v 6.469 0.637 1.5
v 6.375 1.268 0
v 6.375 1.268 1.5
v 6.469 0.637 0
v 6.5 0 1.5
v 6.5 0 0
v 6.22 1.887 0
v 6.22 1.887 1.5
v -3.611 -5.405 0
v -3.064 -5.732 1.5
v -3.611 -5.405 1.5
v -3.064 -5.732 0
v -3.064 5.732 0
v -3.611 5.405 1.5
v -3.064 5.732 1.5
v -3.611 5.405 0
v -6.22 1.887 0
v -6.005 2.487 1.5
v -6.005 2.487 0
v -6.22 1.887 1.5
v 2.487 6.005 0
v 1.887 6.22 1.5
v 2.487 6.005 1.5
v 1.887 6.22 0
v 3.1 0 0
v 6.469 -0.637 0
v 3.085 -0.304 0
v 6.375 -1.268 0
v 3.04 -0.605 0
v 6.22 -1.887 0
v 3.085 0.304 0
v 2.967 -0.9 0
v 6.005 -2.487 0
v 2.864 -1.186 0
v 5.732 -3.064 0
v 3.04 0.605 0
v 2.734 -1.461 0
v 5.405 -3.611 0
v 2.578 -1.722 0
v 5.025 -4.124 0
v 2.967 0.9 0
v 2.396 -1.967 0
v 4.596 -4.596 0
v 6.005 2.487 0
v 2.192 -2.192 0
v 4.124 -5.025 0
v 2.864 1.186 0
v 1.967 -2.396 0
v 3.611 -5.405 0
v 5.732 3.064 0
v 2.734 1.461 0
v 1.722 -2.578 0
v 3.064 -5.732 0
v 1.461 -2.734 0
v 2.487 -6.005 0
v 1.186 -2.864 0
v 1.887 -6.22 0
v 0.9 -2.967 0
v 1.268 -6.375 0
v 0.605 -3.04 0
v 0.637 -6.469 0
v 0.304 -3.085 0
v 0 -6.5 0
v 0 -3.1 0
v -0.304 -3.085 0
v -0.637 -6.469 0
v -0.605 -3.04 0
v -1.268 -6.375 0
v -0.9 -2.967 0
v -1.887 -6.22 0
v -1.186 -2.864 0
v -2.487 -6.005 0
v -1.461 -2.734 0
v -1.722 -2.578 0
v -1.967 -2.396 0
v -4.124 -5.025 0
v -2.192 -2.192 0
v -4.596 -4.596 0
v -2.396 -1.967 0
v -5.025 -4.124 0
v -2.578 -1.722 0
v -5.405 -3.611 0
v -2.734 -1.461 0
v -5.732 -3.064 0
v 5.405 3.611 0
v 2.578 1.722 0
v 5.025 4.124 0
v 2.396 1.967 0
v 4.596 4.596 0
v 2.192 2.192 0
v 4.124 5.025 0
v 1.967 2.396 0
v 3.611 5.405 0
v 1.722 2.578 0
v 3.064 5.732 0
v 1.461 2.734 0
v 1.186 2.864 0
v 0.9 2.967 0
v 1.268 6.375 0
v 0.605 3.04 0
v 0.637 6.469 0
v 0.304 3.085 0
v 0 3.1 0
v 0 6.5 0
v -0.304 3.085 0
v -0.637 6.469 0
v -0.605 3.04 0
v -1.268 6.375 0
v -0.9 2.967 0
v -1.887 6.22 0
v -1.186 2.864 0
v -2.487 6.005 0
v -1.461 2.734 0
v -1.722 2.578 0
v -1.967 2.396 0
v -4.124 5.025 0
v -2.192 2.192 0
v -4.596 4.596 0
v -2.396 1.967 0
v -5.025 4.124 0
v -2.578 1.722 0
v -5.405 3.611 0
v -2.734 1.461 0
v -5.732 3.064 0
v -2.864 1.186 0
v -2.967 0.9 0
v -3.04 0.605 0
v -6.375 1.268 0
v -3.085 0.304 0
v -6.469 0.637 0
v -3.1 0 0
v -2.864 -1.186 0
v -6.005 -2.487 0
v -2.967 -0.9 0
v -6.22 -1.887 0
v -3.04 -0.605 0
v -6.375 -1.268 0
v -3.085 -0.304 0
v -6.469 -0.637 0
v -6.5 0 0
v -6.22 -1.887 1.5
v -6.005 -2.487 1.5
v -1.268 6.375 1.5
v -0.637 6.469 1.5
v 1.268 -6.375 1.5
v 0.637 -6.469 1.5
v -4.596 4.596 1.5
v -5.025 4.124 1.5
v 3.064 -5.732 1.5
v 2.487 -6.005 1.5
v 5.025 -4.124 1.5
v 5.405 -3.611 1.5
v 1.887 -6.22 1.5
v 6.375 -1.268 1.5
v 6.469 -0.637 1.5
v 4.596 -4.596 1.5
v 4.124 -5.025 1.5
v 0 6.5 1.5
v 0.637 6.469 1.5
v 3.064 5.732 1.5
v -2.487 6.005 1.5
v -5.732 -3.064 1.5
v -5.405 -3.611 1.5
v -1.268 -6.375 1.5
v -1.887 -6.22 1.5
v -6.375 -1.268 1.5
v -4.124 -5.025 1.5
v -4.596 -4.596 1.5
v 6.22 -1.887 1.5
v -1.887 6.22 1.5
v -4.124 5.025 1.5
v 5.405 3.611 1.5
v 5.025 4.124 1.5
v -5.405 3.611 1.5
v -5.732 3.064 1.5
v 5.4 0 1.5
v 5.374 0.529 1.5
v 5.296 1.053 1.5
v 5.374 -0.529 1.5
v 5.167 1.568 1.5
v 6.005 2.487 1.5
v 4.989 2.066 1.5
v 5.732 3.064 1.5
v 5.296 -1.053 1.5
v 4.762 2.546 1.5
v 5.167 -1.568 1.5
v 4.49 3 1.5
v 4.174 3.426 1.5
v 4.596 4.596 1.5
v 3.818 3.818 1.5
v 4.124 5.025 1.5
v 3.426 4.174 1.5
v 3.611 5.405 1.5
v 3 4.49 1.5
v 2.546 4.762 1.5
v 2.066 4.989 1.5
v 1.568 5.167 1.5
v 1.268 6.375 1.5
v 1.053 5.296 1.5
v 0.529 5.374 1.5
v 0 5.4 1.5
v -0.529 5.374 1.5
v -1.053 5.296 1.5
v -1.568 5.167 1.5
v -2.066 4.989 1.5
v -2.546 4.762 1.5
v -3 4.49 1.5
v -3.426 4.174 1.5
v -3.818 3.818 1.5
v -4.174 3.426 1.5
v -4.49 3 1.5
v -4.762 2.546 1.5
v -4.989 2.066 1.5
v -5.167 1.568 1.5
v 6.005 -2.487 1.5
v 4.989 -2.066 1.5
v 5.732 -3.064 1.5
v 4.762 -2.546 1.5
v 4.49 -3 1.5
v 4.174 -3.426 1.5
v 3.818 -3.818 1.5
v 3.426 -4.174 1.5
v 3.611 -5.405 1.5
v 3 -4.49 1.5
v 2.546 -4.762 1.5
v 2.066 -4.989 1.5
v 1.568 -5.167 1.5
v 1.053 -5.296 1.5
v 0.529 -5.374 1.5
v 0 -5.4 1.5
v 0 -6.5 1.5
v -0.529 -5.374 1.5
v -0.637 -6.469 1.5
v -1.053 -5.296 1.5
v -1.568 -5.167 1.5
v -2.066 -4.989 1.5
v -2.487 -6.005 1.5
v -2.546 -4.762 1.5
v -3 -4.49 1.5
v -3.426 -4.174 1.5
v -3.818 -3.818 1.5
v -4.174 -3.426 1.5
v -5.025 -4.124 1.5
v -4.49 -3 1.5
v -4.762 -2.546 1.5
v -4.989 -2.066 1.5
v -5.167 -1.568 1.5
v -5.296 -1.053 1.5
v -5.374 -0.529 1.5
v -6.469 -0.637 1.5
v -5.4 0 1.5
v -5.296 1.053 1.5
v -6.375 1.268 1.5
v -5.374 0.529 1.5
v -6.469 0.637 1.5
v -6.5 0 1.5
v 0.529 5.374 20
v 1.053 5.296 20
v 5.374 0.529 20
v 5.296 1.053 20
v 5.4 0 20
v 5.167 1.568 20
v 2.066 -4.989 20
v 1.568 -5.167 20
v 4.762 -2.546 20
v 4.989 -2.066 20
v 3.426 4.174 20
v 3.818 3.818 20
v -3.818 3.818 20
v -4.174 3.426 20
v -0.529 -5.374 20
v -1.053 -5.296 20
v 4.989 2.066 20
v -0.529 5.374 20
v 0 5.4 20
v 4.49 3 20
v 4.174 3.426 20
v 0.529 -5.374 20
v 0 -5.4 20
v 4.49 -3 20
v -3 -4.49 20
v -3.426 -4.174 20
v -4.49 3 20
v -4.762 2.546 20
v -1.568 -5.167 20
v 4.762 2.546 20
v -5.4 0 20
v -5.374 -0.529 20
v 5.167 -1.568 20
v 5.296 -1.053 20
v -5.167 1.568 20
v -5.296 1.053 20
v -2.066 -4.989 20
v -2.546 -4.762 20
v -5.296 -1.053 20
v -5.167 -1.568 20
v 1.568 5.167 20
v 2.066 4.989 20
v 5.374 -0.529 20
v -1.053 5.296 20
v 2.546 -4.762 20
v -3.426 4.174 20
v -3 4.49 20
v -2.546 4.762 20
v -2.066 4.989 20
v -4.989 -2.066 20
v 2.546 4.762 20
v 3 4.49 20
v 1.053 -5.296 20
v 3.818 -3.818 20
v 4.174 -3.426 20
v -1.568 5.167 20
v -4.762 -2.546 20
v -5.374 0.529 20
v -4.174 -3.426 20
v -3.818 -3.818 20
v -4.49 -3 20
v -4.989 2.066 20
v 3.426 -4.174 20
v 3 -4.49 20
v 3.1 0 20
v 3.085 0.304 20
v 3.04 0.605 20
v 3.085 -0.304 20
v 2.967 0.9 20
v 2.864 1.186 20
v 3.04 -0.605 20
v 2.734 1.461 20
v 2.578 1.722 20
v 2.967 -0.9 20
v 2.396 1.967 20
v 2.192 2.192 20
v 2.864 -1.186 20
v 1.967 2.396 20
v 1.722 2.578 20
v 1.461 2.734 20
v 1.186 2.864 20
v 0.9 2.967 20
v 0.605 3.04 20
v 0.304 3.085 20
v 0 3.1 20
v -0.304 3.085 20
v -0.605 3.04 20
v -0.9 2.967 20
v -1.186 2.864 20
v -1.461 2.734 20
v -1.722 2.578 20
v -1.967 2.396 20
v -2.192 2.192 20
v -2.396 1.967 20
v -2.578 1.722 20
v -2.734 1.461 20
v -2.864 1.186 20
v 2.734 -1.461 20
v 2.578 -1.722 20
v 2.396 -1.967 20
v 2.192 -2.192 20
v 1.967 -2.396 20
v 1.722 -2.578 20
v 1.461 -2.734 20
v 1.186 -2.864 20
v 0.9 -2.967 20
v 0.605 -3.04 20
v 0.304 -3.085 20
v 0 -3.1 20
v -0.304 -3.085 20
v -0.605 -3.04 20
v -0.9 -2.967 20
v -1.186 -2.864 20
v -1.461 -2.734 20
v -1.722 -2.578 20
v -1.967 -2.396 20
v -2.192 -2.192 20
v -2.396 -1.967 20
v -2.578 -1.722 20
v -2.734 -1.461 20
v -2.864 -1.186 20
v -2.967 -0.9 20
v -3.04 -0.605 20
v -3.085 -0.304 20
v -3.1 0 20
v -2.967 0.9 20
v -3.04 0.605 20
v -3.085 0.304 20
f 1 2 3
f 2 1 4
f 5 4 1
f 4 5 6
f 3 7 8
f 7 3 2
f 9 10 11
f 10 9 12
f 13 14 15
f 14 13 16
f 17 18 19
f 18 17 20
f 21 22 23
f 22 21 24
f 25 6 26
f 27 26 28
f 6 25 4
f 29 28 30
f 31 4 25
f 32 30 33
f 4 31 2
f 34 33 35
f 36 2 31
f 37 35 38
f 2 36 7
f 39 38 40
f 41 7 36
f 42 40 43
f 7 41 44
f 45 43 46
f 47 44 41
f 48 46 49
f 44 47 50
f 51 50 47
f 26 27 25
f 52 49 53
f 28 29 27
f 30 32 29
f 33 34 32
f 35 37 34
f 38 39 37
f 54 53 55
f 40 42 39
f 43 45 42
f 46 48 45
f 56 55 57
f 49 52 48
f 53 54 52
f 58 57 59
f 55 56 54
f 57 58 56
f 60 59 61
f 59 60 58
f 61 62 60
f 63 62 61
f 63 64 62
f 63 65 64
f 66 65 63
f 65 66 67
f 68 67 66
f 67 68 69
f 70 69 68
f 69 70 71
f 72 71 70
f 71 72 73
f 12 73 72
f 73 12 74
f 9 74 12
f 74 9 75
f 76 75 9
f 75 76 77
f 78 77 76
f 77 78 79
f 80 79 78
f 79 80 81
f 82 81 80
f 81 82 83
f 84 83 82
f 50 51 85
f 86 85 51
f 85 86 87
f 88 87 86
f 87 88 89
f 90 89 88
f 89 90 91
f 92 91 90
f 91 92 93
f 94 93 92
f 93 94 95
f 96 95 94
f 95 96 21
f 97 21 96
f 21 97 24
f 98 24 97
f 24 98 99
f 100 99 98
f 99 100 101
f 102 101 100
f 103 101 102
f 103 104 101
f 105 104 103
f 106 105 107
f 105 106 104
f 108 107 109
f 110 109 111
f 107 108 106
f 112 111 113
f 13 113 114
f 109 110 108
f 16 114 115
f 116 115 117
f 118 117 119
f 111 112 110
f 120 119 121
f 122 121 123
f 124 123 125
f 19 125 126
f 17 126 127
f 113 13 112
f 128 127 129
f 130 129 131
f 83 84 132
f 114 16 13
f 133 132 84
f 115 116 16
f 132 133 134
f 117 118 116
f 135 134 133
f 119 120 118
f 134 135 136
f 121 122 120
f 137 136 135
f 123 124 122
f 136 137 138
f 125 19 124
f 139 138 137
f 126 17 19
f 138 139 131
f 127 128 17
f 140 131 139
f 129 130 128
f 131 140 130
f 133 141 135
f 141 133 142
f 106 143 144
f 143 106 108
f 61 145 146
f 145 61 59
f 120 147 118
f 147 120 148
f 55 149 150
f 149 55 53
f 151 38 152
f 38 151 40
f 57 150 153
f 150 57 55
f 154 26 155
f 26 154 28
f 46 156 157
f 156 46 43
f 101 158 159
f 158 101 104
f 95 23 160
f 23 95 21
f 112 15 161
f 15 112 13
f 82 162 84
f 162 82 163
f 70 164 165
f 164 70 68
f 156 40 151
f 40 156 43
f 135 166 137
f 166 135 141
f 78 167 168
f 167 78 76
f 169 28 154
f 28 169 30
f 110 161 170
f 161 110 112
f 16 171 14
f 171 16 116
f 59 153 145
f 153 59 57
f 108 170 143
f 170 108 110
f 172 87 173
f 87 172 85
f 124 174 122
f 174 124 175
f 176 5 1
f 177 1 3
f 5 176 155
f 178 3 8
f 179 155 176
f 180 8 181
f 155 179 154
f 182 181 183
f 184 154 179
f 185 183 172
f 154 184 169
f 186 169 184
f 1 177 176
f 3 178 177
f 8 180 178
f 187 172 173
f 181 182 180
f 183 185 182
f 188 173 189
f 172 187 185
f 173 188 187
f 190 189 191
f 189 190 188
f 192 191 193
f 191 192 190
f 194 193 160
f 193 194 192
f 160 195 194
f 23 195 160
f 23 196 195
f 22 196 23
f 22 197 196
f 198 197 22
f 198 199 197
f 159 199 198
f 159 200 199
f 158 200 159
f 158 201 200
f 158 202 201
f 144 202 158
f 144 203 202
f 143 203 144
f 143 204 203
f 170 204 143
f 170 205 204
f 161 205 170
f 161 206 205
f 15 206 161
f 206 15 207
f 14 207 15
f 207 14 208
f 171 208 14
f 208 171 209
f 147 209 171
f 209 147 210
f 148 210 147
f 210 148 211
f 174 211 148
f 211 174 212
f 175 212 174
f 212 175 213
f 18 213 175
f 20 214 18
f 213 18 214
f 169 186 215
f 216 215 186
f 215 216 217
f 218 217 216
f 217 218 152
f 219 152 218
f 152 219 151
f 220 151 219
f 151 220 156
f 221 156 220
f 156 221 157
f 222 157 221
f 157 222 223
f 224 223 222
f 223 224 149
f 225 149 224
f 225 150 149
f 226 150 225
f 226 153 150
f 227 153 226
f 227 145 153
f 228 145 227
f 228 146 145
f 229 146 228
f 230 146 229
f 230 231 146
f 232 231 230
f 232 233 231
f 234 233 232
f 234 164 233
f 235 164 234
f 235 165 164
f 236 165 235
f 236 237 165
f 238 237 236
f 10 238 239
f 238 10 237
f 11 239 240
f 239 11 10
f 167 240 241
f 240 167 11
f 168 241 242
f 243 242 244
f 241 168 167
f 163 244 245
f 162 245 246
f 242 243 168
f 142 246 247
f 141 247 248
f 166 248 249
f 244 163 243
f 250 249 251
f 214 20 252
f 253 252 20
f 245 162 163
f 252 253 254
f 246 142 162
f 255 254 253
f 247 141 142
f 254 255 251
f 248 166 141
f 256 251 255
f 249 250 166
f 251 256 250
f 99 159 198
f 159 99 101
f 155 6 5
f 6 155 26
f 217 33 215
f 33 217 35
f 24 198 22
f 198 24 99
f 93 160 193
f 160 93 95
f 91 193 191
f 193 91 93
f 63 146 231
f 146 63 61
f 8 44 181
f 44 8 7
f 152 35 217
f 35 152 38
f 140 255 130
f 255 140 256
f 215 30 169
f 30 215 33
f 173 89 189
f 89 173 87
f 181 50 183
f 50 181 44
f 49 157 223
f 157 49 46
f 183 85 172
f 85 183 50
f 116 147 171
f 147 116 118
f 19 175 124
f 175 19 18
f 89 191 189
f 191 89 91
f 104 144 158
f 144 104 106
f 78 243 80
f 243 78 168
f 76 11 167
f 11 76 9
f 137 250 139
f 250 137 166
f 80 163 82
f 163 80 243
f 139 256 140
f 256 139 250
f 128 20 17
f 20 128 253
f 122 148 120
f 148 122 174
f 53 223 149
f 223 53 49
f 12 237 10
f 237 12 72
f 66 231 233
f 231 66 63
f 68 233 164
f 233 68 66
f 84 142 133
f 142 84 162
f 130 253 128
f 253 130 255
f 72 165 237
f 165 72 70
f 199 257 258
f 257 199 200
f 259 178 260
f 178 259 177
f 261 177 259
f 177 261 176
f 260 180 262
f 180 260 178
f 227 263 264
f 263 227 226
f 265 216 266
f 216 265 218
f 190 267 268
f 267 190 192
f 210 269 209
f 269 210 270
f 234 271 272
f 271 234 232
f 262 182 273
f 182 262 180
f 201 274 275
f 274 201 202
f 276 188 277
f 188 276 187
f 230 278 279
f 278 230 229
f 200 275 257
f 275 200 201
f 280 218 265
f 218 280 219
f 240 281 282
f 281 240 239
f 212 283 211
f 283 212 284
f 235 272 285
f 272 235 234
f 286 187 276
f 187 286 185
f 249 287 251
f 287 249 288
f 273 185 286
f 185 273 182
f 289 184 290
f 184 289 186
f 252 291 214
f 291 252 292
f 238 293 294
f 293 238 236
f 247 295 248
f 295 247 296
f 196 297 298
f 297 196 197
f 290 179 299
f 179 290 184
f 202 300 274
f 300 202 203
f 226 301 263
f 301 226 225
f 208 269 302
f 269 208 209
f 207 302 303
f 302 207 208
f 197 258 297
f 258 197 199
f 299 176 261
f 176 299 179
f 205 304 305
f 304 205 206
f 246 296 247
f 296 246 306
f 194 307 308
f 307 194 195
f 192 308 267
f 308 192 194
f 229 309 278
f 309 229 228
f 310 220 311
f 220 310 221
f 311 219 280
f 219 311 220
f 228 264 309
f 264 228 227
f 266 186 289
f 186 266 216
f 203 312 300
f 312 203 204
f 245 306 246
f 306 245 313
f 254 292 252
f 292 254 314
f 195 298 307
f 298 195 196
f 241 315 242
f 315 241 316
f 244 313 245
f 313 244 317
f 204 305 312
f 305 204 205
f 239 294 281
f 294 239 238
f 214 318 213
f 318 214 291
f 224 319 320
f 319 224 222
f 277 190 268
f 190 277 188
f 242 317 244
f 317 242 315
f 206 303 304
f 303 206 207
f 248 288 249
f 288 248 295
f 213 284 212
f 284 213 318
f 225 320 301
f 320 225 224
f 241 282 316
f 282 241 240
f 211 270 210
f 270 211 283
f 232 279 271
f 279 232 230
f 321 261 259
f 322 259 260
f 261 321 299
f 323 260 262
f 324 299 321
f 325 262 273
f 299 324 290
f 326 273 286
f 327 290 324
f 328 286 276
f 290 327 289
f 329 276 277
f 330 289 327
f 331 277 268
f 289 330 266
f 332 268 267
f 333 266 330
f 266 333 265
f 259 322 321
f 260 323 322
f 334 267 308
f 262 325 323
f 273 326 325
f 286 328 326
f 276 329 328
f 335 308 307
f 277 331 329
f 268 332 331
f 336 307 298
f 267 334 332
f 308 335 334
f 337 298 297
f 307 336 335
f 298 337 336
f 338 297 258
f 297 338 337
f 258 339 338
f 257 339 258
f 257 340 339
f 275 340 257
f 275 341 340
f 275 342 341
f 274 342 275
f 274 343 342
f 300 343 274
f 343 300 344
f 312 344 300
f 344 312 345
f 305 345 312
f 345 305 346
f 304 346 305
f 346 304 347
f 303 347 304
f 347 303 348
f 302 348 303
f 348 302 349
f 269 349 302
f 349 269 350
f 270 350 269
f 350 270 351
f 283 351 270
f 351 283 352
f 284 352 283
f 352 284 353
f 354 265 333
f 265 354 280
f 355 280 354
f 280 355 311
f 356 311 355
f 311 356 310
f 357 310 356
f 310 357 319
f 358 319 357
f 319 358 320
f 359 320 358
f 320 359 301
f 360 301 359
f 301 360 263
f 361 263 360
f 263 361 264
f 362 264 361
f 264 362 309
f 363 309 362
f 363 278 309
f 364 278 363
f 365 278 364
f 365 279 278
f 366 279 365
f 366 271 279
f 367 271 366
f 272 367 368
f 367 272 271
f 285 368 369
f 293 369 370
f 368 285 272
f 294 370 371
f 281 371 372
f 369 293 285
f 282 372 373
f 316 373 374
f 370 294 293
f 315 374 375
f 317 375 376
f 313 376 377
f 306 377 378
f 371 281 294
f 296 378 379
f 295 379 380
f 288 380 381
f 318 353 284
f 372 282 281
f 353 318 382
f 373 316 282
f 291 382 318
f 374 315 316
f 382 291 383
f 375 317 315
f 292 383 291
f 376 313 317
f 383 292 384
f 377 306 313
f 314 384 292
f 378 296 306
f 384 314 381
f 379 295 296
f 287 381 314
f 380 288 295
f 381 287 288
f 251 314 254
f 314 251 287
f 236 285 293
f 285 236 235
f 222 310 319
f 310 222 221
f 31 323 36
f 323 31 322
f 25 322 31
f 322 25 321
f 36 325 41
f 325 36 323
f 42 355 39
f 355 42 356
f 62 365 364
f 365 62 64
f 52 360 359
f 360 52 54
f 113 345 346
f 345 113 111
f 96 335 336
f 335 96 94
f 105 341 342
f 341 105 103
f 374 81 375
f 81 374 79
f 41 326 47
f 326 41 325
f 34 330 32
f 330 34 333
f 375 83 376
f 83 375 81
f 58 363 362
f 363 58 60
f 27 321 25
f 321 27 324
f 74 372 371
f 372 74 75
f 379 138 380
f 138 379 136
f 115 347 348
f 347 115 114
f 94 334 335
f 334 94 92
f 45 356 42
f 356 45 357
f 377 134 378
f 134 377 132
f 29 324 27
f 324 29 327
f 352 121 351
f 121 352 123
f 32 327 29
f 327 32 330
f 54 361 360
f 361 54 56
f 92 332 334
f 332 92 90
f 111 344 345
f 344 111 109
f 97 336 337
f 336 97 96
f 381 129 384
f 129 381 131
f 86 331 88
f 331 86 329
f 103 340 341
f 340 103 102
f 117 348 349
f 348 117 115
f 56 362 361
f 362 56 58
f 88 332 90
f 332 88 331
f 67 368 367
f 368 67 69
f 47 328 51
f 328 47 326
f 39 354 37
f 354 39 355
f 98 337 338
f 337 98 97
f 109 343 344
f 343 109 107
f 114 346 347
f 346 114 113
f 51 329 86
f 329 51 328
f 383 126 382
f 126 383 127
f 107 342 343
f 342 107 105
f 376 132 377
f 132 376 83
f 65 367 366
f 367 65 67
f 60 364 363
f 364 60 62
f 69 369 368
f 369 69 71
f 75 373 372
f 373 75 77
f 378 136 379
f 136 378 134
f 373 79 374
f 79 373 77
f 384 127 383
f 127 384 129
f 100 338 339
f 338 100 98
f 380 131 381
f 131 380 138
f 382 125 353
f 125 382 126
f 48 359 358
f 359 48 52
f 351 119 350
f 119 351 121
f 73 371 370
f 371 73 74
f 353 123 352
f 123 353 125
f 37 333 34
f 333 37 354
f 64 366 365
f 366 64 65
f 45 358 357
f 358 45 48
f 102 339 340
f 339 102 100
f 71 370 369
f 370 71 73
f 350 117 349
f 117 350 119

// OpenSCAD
// --- Dimensions (mm) ---
collar_diameter = 13.0;      // Diameter of the base collar
collar_thickness = 1.5;      // Height of the base collar
sleeve_outer_diameter = 10.8; // Diameter of the main sleeve body
sleeve_height = 21.5 - 1.5;  // Height of the sleeve body (total height - collar)
bore_diameter = 6.2;         // Diameter of the central hole
total_height = 21.5;         // Total height of the part

/* 
   Design Notes:
   - Print orientation: Upside down (Collar on XY plane at Z=0).
   - The part consists of a wide collar at the bottom and a narrower sleeve on top.
   - A central bore runs through the entire height.
*/

$fn = 64; // Smoothness for cylinders

module adapter_sleeve() {
    difference() {
        // Main Body Construction
        union() {
            // The Collar (Base)
            cylinder(d = collar_diameter, h = collar_thickness);
            
            // The Sleeve Body
            cylinder(d = sleeve_outer_diameter, h = sleeve_height);
        }

        // The Bore (Cutting through the whole part)
        // We extend the bore slightly in Z to ensure a clean cut through top and bottom
        translate([0, 0, -0.5])
            cylinder(d = bore_diameter, h = total_height + 1.0);
    }
}

// Render the part
adapter_sleeve();
